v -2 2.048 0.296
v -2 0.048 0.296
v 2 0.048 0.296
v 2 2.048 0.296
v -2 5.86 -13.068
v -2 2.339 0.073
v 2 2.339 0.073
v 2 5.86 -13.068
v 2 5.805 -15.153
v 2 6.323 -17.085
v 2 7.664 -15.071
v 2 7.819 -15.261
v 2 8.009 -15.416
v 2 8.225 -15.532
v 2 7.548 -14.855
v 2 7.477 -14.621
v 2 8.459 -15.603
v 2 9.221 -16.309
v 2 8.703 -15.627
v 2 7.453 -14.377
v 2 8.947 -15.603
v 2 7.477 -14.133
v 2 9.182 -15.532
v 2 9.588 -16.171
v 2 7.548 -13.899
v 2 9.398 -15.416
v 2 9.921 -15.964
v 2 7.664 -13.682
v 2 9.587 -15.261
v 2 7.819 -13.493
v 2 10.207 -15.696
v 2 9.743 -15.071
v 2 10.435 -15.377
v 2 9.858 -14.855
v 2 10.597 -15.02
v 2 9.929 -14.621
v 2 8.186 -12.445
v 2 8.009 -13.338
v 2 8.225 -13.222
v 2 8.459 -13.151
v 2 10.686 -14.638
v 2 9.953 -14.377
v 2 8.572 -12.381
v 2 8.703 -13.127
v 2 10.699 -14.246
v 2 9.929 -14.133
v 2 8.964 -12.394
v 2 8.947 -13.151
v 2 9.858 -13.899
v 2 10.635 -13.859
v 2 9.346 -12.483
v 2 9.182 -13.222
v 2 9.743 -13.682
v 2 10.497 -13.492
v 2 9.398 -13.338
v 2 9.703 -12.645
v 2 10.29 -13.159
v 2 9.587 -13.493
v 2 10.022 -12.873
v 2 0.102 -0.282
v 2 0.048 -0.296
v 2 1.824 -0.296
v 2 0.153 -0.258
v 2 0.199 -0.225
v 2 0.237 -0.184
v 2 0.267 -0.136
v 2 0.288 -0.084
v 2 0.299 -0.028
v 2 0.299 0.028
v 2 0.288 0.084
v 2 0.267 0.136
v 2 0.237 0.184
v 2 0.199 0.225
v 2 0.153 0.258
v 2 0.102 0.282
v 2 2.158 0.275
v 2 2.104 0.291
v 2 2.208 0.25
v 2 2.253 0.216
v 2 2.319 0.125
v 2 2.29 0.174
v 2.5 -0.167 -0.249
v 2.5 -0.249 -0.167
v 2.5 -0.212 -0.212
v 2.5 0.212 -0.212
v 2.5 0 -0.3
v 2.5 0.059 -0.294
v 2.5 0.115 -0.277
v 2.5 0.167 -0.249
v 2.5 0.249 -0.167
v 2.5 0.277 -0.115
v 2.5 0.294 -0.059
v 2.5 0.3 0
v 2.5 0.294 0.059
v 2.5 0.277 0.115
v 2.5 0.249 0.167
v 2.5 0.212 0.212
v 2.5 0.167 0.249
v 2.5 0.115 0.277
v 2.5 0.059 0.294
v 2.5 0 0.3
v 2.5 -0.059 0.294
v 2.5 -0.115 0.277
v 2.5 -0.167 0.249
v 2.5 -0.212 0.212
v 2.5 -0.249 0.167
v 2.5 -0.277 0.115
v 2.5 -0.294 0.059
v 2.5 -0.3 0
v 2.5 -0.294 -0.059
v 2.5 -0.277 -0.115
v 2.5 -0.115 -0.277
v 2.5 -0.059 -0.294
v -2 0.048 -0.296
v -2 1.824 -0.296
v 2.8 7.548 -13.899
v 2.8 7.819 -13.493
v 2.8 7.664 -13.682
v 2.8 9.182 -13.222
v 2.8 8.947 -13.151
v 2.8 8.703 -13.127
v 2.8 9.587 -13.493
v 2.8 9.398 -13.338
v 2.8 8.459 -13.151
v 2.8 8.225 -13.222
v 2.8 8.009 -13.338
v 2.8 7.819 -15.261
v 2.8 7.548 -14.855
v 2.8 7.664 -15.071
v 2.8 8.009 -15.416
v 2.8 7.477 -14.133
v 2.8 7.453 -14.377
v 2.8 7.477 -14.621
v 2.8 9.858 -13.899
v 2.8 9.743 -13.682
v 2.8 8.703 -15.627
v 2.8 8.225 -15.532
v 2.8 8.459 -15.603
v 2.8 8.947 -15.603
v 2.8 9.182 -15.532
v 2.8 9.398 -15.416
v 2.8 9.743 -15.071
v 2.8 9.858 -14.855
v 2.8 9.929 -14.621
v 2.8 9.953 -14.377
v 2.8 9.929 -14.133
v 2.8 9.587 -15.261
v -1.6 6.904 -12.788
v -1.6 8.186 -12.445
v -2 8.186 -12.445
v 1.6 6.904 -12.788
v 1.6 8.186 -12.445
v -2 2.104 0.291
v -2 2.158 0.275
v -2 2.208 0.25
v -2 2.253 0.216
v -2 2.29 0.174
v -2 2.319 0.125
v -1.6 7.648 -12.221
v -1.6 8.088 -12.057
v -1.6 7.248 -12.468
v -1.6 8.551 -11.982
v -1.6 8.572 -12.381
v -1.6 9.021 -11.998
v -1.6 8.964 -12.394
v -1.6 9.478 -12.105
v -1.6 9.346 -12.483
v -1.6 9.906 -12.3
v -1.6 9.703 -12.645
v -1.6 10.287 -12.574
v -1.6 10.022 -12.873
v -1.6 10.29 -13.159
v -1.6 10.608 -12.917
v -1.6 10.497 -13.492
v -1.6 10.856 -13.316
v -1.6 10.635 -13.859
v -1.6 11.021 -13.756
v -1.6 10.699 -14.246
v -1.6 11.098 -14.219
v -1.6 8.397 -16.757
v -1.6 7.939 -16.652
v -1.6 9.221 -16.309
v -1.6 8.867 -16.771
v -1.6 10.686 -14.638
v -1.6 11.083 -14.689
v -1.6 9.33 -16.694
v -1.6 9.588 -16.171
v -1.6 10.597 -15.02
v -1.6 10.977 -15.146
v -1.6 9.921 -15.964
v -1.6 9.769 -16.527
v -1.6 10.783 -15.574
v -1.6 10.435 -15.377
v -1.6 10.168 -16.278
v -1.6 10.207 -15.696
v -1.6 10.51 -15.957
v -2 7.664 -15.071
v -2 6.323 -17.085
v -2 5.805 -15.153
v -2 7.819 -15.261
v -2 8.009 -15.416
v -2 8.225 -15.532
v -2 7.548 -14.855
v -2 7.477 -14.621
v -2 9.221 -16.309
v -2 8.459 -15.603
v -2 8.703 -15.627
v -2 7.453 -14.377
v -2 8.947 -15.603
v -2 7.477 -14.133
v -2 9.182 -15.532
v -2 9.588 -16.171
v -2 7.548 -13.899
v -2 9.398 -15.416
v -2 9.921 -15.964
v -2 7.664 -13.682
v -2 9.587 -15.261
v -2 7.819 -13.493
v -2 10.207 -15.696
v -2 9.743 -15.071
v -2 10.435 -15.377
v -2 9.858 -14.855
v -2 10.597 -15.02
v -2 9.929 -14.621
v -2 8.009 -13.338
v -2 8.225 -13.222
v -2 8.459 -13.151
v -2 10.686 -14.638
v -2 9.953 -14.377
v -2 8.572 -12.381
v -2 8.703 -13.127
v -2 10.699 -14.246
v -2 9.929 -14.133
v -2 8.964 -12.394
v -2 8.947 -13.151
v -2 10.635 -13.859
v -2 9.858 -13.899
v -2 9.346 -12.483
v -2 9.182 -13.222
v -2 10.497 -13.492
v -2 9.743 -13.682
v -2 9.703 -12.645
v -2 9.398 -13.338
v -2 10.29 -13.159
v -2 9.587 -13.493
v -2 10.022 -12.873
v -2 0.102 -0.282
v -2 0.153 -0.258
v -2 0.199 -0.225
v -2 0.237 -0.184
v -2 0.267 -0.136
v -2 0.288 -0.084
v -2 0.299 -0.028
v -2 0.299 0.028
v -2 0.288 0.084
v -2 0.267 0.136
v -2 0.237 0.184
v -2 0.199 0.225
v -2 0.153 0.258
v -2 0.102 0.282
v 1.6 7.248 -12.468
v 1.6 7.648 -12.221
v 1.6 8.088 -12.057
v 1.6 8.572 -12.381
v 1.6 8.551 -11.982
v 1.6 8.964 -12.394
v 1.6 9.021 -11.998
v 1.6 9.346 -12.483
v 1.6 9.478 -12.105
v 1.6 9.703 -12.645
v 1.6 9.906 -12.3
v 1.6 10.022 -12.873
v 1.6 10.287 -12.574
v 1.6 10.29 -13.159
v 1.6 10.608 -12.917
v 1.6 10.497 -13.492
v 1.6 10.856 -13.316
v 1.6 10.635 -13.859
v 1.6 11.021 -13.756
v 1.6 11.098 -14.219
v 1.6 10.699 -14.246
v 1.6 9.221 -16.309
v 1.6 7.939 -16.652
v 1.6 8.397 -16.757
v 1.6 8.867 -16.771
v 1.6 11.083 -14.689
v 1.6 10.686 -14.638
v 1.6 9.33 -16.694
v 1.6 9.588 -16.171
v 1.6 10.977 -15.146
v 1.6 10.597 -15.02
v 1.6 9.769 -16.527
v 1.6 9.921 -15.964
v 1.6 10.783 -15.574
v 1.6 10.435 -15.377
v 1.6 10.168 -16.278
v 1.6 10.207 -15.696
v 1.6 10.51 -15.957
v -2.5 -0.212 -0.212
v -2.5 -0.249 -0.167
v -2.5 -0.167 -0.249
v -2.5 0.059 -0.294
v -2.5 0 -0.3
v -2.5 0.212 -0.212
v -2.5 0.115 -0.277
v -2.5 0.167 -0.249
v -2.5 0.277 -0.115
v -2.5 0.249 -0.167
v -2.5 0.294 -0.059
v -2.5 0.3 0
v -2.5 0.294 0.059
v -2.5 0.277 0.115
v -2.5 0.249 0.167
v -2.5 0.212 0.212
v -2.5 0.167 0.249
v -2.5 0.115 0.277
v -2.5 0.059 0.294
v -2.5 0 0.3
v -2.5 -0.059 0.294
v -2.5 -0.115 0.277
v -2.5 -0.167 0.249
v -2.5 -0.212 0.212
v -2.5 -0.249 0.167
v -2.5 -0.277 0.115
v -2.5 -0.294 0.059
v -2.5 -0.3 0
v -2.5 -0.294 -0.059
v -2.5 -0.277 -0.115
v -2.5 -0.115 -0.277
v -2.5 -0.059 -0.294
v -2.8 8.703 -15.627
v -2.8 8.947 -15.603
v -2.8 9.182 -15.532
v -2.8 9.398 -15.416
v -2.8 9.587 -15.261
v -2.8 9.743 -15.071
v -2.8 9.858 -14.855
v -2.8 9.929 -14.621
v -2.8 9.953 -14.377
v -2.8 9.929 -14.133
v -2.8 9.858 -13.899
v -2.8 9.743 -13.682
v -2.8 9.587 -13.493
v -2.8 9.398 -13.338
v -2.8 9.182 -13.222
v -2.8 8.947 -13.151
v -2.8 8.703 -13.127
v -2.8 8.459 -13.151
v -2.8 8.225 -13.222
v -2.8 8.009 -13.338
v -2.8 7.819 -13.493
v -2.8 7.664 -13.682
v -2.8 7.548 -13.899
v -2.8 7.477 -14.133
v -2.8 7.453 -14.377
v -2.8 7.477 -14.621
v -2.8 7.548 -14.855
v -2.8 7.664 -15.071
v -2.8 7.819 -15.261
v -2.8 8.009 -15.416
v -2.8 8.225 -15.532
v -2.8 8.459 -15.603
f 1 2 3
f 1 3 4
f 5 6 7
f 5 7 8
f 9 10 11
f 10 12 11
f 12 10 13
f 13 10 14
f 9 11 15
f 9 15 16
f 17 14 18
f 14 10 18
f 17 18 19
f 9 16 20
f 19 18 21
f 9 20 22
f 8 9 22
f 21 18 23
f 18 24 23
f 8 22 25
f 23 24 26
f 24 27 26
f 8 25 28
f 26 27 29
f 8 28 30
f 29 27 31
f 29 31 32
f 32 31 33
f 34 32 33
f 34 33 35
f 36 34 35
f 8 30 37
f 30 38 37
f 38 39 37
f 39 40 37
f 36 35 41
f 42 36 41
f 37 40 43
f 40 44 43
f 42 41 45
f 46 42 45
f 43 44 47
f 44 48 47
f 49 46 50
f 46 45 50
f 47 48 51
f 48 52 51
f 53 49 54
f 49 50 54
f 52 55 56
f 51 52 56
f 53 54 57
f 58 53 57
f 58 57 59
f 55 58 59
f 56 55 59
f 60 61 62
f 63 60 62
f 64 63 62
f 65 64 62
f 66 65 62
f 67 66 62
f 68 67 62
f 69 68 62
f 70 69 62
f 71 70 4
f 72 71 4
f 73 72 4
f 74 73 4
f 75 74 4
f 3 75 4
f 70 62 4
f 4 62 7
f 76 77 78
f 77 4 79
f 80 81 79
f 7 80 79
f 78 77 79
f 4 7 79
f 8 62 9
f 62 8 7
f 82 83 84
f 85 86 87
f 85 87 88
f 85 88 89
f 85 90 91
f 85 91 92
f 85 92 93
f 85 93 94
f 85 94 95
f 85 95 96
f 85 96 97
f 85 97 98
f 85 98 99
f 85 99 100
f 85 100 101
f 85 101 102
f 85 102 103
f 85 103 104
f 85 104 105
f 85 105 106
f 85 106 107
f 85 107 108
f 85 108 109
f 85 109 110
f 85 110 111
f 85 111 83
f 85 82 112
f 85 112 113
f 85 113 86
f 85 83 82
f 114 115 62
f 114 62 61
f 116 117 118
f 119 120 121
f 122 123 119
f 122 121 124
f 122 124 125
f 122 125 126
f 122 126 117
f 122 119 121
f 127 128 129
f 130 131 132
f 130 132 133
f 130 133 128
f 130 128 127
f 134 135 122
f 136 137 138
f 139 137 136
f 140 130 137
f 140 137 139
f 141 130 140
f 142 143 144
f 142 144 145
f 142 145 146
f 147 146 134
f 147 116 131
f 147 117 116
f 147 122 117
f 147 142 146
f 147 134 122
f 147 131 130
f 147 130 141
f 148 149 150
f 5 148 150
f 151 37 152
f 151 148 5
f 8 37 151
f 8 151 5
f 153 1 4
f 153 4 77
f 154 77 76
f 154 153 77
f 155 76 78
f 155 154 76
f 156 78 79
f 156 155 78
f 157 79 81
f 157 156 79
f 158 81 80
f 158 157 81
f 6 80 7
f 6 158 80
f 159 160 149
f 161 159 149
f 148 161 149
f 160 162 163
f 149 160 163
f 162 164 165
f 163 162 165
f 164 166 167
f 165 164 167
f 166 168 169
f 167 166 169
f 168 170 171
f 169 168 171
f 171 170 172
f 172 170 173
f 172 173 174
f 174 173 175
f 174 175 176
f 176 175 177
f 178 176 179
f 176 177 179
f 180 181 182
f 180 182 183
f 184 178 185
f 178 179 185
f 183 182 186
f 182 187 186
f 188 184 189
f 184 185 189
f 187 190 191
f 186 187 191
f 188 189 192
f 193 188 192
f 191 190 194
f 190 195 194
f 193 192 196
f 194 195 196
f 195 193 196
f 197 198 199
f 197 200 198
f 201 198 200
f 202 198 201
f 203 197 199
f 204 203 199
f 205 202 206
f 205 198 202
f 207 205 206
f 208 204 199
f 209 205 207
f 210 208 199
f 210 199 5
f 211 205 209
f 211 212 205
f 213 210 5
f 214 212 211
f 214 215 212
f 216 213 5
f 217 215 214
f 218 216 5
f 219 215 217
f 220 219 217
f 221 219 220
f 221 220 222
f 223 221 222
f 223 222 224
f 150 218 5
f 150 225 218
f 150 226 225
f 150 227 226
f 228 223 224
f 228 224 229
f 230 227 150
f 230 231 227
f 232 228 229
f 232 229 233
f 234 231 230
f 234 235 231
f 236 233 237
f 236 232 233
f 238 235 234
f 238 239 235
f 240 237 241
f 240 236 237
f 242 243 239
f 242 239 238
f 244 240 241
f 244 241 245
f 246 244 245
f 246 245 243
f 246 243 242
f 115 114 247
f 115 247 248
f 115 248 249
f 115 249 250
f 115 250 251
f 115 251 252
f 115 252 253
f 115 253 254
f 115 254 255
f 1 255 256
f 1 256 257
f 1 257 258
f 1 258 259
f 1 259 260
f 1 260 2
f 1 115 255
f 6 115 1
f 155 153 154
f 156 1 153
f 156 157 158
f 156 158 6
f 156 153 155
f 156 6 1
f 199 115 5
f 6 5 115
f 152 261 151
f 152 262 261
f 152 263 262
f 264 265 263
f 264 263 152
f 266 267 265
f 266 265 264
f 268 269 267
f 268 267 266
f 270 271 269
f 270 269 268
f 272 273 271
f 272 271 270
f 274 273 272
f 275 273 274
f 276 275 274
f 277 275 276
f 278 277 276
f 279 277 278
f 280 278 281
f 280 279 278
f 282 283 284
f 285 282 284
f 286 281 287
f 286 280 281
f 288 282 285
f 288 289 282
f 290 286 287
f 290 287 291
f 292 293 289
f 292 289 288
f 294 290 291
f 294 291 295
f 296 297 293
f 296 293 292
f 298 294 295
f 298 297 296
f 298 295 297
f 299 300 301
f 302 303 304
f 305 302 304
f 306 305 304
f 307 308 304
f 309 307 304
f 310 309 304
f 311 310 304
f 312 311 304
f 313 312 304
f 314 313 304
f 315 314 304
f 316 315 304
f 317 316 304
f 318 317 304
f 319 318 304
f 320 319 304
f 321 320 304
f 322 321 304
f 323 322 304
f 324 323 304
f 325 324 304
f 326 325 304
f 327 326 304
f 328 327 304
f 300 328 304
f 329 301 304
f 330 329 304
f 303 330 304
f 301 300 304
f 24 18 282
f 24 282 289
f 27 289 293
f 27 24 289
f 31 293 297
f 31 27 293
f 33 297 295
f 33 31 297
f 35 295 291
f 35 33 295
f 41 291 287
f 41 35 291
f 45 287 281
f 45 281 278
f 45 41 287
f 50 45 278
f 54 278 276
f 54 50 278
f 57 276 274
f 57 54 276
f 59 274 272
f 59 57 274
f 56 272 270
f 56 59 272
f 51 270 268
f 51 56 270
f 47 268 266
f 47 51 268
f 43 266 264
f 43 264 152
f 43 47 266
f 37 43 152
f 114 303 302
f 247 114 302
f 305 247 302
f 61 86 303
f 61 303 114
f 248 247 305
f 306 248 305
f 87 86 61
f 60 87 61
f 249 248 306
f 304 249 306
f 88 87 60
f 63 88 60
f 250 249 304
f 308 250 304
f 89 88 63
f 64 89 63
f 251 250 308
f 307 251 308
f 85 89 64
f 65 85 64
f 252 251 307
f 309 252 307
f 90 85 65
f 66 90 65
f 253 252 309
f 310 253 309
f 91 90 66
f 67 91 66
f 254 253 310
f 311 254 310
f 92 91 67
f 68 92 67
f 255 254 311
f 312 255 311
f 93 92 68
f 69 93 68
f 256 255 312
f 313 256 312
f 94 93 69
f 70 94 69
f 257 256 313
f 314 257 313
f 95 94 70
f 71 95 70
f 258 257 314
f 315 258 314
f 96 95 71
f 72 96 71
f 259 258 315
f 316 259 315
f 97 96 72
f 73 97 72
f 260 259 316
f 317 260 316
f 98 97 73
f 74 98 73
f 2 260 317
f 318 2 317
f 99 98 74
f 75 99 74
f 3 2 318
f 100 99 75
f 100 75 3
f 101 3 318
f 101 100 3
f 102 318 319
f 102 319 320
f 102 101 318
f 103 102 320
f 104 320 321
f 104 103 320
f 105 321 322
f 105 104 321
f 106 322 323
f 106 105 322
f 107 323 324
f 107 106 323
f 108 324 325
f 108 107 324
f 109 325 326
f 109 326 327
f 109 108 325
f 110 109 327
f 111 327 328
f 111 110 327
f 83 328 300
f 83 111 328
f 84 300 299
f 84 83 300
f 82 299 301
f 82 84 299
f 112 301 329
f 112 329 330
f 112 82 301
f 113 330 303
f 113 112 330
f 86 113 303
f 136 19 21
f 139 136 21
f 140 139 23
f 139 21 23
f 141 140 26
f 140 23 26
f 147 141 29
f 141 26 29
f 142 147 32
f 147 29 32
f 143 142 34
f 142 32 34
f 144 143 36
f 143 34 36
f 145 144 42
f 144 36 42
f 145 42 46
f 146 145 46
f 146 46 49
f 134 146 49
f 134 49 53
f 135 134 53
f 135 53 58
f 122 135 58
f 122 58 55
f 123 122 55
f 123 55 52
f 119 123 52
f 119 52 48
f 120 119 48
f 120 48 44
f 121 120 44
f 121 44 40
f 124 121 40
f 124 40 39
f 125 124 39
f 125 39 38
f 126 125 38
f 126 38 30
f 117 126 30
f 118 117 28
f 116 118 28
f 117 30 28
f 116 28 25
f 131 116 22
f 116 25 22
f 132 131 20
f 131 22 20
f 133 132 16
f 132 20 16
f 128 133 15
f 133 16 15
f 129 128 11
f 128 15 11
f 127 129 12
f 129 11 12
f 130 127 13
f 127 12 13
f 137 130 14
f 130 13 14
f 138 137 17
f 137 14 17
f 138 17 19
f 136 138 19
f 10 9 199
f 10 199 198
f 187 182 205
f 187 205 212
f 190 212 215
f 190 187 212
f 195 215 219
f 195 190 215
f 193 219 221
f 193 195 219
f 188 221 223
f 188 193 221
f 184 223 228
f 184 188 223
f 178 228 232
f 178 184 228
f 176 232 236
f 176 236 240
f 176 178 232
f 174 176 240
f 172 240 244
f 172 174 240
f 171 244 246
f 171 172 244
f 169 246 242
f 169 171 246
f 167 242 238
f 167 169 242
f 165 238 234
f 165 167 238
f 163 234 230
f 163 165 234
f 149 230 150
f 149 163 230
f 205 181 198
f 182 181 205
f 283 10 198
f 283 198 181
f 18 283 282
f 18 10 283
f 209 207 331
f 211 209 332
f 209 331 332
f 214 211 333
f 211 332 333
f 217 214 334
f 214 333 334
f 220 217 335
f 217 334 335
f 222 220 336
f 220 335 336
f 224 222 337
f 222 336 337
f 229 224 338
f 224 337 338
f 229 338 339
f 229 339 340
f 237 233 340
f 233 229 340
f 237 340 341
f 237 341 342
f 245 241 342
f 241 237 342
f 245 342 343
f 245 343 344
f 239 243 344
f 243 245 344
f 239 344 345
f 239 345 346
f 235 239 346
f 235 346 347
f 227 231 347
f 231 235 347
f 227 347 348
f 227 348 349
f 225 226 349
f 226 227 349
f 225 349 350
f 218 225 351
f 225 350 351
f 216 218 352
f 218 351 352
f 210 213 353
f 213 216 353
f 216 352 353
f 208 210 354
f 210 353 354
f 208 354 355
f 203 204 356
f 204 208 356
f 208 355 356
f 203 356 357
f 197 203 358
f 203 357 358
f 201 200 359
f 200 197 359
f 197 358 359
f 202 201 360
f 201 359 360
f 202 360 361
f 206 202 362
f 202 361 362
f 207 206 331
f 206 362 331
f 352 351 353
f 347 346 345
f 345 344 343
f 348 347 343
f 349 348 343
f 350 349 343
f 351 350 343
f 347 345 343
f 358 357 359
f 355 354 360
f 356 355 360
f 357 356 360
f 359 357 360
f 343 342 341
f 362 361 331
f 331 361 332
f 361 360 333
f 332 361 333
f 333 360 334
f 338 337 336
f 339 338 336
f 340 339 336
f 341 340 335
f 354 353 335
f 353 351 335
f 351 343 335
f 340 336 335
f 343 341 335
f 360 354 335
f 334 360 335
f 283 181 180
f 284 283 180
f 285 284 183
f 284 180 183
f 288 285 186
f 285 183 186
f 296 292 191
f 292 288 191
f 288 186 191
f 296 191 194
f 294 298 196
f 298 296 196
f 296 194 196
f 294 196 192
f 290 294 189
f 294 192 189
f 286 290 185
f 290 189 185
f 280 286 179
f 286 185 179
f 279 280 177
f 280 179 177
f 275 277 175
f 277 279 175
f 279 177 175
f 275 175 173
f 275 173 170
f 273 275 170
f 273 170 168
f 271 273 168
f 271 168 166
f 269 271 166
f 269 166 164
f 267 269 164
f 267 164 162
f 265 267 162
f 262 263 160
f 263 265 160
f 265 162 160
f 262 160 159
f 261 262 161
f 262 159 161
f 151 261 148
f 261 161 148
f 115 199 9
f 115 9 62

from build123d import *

# Parameters (mm, degrees)
SKETCH1_R                = 0.3
BOSS_EXTRUDE1_DEPTH      = 2.5
BOSS_EXTRUDE2_DEPTH      = 2
BOSS_EXTRUDE2_DEPTH_BACK = 2
BOSS_EXTRUDE3_DEPTH      = 4
BOSS_EXTRUDE4_DEPTH      = 1.6
BOSS_EXTRUDE4_DEPTH_BACK = 1.6
SKETCH5_R                = 2.4
BOSS_EXTRUDE5_DEPTH      = 2.8
BOSS_EXTRUDE5_DEPTH_BACK = 2.8
SKETCH6_R                = 1.25


with BuildPart() as part:
    # Sketch1 → Boss-Extrude1 (new, symmetric)
    with BuildSketch(Plane(origin=(0, 0, 0), x_dir=(0, 0, -1), z_dir=(1, 0, 0))):
        Circle(SKETCH1_R)
    extrude(amount=BOSS_EXTRUDE1_DEPTH, both=True)

    # Sketch2 → Boss-Extrude2 (add, two sides: drawn at the far end of the back side and taken through both)
    with BuildSketch(Plane(origin=(0, 0, 0), x_dir=(0, 0, -1), z_dir=(1, 0, 0)).offset(-BOSS_EXTRUDE2_DEPTH_BACK)):
        with BuildLine():
            Line((-0.296211166, 0.047528362), (-0.296211166, 2.047528362))
            ThreePointArc((-0.296211166, 2.047528362), (-0.233869415, 2.231181239), (-0.07260959, 2.338931609))
            Line((-0.07260959, 2.338931609), (15, 6.377625177))
            Line((15, 6.377625177), (15.153330182, 5.805389146))
            Line((15.153330182, 5.805389146), (0.296211166, 1.824436104))
            Line((0.296211166, 1.824436104), (0.296211166, 0.047528362))
            Line((0.296211166, 0.047528362), (-0.296211166, 0.047528362))
        make_face()
    extrude(amount=BOSS_EXTRUDE2_DEPTH + BOSS_EXTRUDE2_DEPTH_BACK)

    # Sketch4 → Boss-Extrude3 (add)
    with BuildSketch(Plane(origin=(2, 0, 0), x_dir=(0, 0, -1), z_dir=(1, 0, 0))):
        with BuildLine():
            Line((13.22147853, 5.287751056), (17.085181835, 6.323027237))
            Line((17.085181835, 6.323027237), (16.308724699, 9.220804715))
            ThreePointArc((16.308724699, 9.220804715), (13.859234957, 10.635018278), (12.445021394, 8.185528535))
            Line((12.445021394, 8.185528535), (13.22147853, 5.287751056))
        make_face()
    extrude(amount=-BOSS_EXTRUDE3_DEPTH)

    # Sketch5 → Boss-Extrude4 (add, two sides: drawn at the far end of the back side and taken through both)
    with BuildSketch(Plane(origin=(0, 0, 0), x_dir=(0, 0, -1), z_dir=(1, 0, 0)).offset(-BOSS_EXTRUDE4_DEPTH_BACK)):
        with Locations((14.376873047, 8.703166625)):
            Circle(SKETCH5_R)
    extrude(amount=BOSS_EXTRUDE4_DEPTH + BOSS_EXTRUDE4_DEPTH_BACK)

    # Sketch6 → Boss-Extrude5 (add, two sides: drawn at the far end of the back side and taken through both)
    with BuildSketch(Plane(origin=(0, 0, 0), x_dir=(0, 0, -1), z_dir=(1, 0, 0)).offset(-BOSS_EXTRUDE5_DEPTH_BACK)):
        with Locations((14.376873047, 8.703166625)):
            Circle(SKETCH6_R)
    extrude(amount=BOSS_EXTRUDE5_DEPTH + BOSS_EXTRUDE5_DEPTH_BACK)


solid = part.part
